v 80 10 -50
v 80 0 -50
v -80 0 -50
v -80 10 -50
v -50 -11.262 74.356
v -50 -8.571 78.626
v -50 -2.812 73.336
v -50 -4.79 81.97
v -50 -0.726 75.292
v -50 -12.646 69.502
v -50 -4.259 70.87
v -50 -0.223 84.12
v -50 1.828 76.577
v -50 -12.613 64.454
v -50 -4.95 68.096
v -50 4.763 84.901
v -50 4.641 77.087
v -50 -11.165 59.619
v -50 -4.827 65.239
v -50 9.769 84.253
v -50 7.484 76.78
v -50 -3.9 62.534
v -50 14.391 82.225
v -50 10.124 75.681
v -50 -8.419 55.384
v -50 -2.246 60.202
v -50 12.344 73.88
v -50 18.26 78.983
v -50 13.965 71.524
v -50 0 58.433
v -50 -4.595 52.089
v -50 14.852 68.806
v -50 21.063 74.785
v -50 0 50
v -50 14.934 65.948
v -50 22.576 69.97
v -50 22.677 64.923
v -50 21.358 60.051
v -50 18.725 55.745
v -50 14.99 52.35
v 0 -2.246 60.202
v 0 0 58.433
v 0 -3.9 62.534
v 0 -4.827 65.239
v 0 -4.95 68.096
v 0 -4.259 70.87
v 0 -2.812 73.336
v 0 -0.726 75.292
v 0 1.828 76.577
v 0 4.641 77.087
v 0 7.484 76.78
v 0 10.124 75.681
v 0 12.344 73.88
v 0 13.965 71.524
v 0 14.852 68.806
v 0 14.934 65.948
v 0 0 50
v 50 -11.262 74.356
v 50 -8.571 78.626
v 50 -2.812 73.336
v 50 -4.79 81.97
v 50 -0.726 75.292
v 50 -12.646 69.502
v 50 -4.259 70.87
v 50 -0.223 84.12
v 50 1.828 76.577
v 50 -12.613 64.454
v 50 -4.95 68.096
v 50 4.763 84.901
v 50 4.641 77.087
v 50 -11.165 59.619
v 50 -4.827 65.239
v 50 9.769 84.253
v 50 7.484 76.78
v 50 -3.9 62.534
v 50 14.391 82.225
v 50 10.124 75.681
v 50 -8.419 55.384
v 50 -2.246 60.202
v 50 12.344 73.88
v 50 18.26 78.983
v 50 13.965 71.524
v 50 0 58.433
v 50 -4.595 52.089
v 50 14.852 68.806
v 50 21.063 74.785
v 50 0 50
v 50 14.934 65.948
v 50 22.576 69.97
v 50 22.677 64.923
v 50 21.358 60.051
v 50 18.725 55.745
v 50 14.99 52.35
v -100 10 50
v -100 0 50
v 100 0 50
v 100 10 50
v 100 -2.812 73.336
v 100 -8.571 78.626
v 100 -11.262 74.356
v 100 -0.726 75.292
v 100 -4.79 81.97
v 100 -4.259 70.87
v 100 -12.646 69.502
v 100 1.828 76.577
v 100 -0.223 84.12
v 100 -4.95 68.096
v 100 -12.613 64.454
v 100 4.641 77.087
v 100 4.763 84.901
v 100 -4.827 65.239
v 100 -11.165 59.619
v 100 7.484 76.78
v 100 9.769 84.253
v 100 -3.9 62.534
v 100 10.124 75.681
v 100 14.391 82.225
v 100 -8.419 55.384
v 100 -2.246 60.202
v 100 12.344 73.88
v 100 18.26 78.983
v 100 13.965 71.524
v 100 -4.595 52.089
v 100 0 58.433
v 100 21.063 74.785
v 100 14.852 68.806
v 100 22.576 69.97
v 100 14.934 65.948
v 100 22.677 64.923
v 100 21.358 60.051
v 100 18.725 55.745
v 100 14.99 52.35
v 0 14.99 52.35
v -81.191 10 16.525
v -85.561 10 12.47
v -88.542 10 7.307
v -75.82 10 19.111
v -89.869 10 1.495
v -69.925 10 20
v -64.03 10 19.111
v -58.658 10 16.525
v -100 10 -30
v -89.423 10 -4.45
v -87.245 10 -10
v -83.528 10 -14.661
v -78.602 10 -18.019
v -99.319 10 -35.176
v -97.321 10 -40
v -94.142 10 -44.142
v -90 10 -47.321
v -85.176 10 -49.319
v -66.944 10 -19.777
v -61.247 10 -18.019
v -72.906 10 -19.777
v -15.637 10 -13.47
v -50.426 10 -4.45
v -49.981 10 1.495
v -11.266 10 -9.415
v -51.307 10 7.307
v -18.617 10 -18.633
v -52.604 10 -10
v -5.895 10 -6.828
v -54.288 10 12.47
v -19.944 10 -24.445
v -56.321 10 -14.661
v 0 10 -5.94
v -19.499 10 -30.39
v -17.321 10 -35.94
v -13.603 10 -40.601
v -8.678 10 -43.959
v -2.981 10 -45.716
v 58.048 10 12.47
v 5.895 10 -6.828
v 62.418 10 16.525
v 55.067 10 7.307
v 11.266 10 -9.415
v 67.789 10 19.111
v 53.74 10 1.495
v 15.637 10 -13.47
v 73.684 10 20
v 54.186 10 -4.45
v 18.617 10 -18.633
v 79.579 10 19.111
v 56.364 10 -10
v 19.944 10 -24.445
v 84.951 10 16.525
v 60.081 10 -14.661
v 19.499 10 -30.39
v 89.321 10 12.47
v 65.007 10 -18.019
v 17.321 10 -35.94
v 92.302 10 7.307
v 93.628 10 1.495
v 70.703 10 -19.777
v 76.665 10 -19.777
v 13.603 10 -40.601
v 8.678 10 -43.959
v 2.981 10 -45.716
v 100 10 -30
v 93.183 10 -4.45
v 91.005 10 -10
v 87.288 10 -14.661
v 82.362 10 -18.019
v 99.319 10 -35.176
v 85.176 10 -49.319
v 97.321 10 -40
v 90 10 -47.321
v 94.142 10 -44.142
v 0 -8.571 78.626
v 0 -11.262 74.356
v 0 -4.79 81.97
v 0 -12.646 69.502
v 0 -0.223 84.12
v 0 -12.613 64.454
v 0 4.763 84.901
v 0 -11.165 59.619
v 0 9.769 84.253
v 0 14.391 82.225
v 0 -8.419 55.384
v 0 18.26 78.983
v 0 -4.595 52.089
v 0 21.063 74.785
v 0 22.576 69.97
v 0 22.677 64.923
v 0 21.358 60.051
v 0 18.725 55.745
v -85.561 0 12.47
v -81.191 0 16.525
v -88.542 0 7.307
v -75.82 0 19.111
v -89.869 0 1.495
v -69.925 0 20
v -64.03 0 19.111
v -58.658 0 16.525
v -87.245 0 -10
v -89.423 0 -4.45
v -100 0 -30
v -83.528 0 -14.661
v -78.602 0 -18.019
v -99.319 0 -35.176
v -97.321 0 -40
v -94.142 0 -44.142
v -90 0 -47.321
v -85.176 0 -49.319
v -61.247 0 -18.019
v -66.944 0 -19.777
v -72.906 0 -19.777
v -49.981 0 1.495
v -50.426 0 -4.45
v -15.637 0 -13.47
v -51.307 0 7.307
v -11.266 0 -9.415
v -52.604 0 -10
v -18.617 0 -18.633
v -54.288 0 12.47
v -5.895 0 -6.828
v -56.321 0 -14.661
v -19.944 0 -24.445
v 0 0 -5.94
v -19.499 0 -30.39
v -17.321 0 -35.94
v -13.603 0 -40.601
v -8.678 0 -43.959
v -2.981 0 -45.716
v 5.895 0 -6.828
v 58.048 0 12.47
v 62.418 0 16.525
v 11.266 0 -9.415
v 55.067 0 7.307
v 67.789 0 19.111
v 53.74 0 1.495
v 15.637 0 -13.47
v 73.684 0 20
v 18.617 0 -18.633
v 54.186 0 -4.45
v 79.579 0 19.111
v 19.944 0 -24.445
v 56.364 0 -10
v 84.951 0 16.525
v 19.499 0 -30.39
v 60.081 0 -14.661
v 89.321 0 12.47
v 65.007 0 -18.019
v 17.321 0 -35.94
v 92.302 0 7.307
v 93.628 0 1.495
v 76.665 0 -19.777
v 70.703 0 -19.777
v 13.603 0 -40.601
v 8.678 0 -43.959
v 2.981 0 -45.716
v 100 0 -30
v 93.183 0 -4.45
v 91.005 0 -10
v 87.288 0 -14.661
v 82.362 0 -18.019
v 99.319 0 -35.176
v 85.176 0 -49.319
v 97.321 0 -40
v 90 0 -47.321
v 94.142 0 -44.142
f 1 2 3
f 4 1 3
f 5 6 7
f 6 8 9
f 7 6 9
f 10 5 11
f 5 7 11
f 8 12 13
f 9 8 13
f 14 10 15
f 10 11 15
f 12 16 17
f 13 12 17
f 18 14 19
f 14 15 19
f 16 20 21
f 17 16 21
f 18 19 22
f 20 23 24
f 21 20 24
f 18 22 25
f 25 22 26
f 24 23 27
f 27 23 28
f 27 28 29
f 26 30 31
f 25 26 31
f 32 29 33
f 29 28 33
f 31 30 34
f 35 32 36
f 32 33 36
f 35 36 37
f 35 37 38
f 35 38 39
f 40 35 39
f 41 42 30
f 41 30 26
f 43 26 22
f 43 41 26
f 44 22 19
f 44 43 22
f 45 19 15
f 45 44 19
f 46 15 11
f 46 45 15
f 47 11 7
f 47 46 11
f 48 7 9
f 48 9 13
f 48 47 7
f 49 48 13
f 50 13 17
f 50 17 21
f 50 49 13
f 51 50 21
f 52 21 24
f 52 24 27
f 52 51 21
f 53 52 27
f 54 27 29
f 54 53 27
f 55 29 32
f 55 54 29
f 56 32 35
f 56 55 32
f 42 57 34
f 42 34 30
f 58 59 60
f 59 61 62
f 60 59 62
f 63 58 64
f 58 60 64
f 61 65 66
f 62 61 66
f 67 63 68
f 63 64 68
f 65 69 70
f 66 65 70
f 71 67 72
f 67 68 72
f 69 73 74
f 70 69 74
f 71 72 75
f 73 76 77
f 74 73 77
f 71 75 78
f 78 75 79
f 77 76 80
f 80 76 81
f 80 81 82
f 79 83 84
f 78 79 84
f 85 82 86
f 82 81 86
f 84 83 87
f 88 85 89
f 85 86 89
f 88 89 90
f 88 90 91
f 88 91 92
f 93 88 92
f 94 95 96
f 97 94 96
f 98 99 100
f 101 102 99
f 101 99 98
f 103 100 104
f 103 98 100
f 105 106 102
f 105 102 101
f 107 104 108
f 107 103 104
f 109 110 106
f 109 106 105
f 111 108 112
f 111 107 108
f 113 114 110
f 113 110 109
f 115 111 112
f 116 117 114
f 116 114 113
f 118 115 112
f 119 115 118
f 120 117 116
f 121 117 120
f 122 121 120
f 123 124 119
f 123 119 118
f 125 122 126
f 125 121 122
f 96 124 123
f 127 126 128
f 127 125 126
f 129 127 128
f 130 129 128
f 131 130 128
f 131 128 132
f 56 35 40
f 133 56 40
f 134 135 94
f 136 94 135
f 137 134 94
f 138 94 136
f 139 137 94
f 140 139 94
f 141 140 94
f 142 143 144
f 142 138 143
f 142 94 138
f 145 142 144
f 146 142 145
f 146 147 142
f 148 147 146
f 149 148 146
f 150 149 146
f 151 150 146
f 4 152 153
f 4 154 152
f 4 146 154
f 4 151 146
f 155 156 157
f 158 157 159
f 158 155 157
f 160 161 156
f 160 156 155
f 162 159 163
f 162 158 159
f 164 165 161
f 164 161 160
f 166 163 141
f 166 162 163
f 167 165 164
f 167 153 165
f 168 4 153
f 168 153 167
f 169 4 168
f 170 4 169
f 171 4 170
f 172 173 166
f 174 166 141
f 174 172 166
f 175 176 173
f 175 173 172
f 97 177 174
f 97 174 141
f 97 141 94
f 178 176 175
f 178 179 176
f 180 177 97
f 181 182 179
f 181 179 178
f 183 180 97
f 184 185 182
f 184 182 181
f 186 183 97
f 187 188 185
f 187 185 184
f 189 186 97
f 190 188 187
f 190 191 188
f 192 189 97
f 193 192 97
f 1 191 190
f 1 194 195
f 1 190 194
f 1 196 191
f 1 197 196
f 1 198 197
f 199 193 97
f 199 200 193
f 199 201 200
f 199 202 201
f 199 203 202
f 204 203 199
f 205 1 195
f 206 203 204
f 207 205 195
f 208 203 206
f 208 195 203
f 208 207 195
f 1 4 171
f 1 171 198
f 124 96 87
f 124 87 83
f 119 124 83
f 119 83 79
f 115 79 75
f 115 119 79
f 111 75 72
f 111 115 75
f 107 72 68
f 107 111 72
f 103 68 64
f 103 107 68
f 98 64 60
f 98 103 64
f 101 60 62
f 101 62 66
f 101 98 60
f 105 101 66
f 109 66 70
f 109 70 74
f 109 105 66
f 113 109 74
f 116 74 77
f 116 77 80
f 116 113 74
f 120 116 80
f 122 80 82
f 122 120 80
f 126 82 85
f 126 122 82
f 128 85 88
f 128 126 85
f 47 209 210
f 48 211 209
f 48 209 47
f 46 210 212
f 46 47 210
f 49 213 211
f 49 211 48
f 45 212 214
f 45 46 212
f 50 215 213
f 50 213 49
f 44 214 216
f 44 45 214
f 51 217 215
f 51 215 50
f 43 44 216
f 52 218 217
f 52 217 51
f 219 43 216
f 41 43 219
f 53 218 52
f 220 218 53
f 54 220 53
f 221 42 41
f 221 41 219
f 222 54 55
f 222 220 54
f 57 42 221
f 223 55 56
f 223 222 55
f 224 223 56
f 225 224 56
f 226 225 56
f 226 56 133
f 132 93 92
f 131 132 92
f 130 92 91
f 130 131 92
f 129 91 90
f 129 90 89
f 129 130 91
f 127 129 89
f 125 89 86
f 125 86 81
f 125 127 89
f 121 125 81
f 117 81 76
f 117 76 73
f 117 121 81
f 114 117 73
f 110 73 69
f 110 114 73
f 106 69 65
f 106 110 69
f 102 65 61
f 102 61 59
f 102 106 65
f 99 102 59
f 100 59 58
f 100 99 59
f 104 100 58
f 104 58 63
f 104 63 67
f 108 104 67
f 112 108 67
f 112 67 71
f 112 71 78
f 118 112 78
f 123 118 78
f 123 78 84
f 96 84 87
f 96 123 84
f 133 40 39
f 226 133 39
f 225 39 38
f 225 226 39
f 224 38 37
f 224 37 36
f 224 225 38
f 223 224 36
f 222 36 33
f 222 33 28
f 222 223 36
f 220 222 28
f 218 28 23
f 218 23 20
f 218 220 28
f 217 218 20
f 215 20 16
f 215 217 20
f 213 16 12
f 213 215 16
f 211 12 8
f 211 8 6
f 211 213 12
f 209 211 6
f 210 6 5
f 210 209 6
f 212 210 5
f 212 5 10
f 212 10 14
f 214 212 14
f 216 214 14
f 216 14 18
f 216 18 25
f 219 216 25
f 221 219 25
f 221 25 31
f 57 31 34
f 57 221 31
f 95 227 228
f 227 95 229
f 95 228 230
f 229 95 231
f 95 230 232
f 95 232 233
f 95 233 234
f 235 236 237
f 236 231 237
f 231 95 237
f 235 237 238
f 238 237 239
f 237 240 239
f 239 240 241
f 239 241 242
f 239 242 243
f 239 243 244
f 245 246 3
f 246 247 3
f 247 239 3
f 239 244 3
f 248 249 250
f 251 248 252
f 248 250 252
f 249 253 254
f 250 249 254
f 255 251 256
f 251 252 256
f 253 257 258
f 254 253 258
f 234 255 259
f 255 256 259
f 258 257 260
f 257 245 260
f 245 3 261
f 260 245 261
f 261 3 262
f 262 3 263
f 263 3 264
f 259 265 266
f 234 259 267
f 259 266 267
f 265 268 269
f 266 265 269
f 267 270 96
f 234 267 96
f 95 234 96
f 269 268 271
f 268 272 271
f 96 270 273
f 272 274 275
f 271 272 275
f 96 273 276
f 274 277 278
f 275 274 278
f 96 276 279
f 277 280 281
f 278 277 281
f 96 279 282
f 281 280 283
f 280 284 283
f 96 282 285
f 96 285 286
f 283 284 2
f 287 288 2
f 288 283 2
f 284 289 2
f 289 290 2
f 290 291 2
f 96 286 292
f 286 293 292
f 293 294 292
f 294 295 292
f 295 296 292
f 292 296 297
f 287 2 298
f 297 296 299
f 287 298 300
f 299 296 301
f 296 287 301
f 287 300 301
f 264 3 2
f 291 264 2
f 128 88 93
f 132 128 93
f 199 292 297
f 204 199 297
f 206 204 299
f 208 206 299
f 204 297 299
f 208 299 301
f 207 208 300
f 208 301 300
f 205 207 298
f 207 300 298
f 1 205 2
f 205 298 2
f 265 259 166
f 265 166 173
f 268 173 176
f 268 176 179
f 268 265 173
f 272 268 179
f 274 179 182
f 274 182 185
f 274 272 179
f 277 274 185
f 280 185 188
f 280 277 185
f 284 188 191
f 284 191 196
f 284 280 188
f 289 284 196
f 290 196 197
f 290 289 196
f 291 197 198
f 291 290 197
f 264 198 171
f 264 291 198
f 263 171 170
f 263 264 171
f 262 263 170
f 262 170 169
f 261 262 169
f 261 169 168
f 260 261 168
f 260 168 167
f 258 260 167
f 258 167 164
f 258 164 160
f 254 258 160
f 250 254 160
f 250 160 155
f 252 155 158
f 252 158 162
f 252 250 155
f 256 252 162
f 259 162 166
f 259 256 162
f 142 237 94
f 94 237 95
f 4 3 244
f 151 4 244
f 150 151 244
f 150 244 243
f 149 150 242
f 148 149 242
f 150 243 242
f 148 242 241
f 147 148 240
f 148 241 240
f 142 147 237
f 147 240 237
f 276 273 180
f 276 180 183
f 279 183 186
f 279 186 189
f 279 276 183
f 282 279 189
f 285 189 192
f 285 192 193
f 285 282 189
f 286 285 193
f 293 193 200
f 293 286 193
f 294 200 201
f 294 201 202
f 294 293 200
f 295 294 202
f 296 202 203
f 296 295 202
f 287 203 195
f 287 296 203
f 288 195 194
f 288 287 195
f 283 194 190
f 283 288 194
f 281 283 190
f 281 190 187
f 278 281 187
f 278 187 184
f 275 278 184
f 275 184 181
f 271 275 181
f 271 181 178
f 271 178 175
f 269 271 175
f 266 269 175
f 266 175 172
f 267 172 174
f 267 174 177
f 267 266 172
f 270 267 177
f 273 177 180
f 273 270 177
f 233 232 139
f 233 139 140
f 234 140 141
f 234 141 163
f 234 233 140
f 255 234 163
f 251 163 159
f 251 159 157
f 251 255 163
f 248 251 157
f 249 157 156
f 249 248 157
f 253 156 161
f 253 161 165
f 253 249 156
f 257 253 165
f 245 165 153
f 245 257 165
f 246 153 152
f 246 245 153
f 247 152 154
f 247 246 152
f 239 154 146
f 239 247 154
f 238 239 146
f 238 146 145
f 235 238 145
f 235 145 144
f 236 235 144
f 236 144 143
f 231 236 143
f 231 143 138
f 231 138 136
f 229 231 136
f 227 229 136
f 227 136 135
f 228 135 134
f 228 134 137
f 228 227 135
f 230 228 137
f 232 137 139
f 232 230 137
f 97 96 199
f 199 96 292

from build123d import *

# Parameters (mm, degrees)
SKETCH2_R           = 20
BOSS_EXTRUDE2_DEPTH = 10
BOSS_EXTRUDE5_DEPTH = 50
LPATTERN1_COUNT     = 2
LPATTERN1_PITCH     = 100


with BuildPart() as part:
    # Sketch2 → Boss-Extrude2 (new body)
    with BuildSketch(Plane(origin=(0, 0, 0), x_dir=(1, 0, 0), z_dir=(0, 1, 0))):
        with BuildLine():
            Line((-100, -50), (100, -50))
            Line((100, -50), (100, 30))
            ThreePointArc((100, 30), (94.142135624, 44.142135624), (80, 50))
            Line((80, 50), (-80, 50))
            ThreePointArc((-80, 50), (-94.142135624, 44.142135624), (-100, 30))
            Line((-100, 30), (-100, -50))
        make_face()
        with Locations(Location((0, 25.939849624, 0), (0, 0, 270))):
            Circle(SKETCH2_R, mode=Mode.SUBTRACT)
        with Locations(Location((73.684210526, 0, 0), (0, 0, 270))):
            Circle(SKETCH2_R, mode=Mode.SUBTRACT)
        with Locations(Location((-69.92481203, 0, 0), (0, 0, 270))):
            Circle(SKETCH2_R, mode=Mode.SUBTRACT)
    extrude(amount=BOSS_EXTRUDE2_DEPTH)


with BuildPart() as body_2:
    # Sketch3 → Boss-Extrude5 (new body)
    with BuildSketch(Plane(origin=(100, 0, 0), x_dir=(0, 0, -1), z_dir=(1, 0, 0))):
        with BuildLine():
            ThreePointArc((-52.349669205, 14.990309114), (-84.688048426, 2.242096338), (-50, 0))
            Line((-50, 0), (-58.433050285, 0))
            ThreePointArc((-58.433050285, 0), (-76.026046531, 0.504878572), (-65.948228442, 14.934223736))
            Line((-65.948228442, 14.934223736), (-52.349669205, 14.990309114))
        make_face()
    boss_extrude5 = extrude(amount=-BOSS_EXTRUDE5_DEPTH)


with BuildPart() as lpattern1_1:
    # LPattern1: Boss-Extrude5 ×2
    with Locations(*[(-i * LPATTERN1_PITCH, 0, 0) for i in range(1, LPATTERN1_COUNT)]):
        add(boss_extrude5)


solid = Compound([part.part, body_2.part, lpattern1_1.part])
